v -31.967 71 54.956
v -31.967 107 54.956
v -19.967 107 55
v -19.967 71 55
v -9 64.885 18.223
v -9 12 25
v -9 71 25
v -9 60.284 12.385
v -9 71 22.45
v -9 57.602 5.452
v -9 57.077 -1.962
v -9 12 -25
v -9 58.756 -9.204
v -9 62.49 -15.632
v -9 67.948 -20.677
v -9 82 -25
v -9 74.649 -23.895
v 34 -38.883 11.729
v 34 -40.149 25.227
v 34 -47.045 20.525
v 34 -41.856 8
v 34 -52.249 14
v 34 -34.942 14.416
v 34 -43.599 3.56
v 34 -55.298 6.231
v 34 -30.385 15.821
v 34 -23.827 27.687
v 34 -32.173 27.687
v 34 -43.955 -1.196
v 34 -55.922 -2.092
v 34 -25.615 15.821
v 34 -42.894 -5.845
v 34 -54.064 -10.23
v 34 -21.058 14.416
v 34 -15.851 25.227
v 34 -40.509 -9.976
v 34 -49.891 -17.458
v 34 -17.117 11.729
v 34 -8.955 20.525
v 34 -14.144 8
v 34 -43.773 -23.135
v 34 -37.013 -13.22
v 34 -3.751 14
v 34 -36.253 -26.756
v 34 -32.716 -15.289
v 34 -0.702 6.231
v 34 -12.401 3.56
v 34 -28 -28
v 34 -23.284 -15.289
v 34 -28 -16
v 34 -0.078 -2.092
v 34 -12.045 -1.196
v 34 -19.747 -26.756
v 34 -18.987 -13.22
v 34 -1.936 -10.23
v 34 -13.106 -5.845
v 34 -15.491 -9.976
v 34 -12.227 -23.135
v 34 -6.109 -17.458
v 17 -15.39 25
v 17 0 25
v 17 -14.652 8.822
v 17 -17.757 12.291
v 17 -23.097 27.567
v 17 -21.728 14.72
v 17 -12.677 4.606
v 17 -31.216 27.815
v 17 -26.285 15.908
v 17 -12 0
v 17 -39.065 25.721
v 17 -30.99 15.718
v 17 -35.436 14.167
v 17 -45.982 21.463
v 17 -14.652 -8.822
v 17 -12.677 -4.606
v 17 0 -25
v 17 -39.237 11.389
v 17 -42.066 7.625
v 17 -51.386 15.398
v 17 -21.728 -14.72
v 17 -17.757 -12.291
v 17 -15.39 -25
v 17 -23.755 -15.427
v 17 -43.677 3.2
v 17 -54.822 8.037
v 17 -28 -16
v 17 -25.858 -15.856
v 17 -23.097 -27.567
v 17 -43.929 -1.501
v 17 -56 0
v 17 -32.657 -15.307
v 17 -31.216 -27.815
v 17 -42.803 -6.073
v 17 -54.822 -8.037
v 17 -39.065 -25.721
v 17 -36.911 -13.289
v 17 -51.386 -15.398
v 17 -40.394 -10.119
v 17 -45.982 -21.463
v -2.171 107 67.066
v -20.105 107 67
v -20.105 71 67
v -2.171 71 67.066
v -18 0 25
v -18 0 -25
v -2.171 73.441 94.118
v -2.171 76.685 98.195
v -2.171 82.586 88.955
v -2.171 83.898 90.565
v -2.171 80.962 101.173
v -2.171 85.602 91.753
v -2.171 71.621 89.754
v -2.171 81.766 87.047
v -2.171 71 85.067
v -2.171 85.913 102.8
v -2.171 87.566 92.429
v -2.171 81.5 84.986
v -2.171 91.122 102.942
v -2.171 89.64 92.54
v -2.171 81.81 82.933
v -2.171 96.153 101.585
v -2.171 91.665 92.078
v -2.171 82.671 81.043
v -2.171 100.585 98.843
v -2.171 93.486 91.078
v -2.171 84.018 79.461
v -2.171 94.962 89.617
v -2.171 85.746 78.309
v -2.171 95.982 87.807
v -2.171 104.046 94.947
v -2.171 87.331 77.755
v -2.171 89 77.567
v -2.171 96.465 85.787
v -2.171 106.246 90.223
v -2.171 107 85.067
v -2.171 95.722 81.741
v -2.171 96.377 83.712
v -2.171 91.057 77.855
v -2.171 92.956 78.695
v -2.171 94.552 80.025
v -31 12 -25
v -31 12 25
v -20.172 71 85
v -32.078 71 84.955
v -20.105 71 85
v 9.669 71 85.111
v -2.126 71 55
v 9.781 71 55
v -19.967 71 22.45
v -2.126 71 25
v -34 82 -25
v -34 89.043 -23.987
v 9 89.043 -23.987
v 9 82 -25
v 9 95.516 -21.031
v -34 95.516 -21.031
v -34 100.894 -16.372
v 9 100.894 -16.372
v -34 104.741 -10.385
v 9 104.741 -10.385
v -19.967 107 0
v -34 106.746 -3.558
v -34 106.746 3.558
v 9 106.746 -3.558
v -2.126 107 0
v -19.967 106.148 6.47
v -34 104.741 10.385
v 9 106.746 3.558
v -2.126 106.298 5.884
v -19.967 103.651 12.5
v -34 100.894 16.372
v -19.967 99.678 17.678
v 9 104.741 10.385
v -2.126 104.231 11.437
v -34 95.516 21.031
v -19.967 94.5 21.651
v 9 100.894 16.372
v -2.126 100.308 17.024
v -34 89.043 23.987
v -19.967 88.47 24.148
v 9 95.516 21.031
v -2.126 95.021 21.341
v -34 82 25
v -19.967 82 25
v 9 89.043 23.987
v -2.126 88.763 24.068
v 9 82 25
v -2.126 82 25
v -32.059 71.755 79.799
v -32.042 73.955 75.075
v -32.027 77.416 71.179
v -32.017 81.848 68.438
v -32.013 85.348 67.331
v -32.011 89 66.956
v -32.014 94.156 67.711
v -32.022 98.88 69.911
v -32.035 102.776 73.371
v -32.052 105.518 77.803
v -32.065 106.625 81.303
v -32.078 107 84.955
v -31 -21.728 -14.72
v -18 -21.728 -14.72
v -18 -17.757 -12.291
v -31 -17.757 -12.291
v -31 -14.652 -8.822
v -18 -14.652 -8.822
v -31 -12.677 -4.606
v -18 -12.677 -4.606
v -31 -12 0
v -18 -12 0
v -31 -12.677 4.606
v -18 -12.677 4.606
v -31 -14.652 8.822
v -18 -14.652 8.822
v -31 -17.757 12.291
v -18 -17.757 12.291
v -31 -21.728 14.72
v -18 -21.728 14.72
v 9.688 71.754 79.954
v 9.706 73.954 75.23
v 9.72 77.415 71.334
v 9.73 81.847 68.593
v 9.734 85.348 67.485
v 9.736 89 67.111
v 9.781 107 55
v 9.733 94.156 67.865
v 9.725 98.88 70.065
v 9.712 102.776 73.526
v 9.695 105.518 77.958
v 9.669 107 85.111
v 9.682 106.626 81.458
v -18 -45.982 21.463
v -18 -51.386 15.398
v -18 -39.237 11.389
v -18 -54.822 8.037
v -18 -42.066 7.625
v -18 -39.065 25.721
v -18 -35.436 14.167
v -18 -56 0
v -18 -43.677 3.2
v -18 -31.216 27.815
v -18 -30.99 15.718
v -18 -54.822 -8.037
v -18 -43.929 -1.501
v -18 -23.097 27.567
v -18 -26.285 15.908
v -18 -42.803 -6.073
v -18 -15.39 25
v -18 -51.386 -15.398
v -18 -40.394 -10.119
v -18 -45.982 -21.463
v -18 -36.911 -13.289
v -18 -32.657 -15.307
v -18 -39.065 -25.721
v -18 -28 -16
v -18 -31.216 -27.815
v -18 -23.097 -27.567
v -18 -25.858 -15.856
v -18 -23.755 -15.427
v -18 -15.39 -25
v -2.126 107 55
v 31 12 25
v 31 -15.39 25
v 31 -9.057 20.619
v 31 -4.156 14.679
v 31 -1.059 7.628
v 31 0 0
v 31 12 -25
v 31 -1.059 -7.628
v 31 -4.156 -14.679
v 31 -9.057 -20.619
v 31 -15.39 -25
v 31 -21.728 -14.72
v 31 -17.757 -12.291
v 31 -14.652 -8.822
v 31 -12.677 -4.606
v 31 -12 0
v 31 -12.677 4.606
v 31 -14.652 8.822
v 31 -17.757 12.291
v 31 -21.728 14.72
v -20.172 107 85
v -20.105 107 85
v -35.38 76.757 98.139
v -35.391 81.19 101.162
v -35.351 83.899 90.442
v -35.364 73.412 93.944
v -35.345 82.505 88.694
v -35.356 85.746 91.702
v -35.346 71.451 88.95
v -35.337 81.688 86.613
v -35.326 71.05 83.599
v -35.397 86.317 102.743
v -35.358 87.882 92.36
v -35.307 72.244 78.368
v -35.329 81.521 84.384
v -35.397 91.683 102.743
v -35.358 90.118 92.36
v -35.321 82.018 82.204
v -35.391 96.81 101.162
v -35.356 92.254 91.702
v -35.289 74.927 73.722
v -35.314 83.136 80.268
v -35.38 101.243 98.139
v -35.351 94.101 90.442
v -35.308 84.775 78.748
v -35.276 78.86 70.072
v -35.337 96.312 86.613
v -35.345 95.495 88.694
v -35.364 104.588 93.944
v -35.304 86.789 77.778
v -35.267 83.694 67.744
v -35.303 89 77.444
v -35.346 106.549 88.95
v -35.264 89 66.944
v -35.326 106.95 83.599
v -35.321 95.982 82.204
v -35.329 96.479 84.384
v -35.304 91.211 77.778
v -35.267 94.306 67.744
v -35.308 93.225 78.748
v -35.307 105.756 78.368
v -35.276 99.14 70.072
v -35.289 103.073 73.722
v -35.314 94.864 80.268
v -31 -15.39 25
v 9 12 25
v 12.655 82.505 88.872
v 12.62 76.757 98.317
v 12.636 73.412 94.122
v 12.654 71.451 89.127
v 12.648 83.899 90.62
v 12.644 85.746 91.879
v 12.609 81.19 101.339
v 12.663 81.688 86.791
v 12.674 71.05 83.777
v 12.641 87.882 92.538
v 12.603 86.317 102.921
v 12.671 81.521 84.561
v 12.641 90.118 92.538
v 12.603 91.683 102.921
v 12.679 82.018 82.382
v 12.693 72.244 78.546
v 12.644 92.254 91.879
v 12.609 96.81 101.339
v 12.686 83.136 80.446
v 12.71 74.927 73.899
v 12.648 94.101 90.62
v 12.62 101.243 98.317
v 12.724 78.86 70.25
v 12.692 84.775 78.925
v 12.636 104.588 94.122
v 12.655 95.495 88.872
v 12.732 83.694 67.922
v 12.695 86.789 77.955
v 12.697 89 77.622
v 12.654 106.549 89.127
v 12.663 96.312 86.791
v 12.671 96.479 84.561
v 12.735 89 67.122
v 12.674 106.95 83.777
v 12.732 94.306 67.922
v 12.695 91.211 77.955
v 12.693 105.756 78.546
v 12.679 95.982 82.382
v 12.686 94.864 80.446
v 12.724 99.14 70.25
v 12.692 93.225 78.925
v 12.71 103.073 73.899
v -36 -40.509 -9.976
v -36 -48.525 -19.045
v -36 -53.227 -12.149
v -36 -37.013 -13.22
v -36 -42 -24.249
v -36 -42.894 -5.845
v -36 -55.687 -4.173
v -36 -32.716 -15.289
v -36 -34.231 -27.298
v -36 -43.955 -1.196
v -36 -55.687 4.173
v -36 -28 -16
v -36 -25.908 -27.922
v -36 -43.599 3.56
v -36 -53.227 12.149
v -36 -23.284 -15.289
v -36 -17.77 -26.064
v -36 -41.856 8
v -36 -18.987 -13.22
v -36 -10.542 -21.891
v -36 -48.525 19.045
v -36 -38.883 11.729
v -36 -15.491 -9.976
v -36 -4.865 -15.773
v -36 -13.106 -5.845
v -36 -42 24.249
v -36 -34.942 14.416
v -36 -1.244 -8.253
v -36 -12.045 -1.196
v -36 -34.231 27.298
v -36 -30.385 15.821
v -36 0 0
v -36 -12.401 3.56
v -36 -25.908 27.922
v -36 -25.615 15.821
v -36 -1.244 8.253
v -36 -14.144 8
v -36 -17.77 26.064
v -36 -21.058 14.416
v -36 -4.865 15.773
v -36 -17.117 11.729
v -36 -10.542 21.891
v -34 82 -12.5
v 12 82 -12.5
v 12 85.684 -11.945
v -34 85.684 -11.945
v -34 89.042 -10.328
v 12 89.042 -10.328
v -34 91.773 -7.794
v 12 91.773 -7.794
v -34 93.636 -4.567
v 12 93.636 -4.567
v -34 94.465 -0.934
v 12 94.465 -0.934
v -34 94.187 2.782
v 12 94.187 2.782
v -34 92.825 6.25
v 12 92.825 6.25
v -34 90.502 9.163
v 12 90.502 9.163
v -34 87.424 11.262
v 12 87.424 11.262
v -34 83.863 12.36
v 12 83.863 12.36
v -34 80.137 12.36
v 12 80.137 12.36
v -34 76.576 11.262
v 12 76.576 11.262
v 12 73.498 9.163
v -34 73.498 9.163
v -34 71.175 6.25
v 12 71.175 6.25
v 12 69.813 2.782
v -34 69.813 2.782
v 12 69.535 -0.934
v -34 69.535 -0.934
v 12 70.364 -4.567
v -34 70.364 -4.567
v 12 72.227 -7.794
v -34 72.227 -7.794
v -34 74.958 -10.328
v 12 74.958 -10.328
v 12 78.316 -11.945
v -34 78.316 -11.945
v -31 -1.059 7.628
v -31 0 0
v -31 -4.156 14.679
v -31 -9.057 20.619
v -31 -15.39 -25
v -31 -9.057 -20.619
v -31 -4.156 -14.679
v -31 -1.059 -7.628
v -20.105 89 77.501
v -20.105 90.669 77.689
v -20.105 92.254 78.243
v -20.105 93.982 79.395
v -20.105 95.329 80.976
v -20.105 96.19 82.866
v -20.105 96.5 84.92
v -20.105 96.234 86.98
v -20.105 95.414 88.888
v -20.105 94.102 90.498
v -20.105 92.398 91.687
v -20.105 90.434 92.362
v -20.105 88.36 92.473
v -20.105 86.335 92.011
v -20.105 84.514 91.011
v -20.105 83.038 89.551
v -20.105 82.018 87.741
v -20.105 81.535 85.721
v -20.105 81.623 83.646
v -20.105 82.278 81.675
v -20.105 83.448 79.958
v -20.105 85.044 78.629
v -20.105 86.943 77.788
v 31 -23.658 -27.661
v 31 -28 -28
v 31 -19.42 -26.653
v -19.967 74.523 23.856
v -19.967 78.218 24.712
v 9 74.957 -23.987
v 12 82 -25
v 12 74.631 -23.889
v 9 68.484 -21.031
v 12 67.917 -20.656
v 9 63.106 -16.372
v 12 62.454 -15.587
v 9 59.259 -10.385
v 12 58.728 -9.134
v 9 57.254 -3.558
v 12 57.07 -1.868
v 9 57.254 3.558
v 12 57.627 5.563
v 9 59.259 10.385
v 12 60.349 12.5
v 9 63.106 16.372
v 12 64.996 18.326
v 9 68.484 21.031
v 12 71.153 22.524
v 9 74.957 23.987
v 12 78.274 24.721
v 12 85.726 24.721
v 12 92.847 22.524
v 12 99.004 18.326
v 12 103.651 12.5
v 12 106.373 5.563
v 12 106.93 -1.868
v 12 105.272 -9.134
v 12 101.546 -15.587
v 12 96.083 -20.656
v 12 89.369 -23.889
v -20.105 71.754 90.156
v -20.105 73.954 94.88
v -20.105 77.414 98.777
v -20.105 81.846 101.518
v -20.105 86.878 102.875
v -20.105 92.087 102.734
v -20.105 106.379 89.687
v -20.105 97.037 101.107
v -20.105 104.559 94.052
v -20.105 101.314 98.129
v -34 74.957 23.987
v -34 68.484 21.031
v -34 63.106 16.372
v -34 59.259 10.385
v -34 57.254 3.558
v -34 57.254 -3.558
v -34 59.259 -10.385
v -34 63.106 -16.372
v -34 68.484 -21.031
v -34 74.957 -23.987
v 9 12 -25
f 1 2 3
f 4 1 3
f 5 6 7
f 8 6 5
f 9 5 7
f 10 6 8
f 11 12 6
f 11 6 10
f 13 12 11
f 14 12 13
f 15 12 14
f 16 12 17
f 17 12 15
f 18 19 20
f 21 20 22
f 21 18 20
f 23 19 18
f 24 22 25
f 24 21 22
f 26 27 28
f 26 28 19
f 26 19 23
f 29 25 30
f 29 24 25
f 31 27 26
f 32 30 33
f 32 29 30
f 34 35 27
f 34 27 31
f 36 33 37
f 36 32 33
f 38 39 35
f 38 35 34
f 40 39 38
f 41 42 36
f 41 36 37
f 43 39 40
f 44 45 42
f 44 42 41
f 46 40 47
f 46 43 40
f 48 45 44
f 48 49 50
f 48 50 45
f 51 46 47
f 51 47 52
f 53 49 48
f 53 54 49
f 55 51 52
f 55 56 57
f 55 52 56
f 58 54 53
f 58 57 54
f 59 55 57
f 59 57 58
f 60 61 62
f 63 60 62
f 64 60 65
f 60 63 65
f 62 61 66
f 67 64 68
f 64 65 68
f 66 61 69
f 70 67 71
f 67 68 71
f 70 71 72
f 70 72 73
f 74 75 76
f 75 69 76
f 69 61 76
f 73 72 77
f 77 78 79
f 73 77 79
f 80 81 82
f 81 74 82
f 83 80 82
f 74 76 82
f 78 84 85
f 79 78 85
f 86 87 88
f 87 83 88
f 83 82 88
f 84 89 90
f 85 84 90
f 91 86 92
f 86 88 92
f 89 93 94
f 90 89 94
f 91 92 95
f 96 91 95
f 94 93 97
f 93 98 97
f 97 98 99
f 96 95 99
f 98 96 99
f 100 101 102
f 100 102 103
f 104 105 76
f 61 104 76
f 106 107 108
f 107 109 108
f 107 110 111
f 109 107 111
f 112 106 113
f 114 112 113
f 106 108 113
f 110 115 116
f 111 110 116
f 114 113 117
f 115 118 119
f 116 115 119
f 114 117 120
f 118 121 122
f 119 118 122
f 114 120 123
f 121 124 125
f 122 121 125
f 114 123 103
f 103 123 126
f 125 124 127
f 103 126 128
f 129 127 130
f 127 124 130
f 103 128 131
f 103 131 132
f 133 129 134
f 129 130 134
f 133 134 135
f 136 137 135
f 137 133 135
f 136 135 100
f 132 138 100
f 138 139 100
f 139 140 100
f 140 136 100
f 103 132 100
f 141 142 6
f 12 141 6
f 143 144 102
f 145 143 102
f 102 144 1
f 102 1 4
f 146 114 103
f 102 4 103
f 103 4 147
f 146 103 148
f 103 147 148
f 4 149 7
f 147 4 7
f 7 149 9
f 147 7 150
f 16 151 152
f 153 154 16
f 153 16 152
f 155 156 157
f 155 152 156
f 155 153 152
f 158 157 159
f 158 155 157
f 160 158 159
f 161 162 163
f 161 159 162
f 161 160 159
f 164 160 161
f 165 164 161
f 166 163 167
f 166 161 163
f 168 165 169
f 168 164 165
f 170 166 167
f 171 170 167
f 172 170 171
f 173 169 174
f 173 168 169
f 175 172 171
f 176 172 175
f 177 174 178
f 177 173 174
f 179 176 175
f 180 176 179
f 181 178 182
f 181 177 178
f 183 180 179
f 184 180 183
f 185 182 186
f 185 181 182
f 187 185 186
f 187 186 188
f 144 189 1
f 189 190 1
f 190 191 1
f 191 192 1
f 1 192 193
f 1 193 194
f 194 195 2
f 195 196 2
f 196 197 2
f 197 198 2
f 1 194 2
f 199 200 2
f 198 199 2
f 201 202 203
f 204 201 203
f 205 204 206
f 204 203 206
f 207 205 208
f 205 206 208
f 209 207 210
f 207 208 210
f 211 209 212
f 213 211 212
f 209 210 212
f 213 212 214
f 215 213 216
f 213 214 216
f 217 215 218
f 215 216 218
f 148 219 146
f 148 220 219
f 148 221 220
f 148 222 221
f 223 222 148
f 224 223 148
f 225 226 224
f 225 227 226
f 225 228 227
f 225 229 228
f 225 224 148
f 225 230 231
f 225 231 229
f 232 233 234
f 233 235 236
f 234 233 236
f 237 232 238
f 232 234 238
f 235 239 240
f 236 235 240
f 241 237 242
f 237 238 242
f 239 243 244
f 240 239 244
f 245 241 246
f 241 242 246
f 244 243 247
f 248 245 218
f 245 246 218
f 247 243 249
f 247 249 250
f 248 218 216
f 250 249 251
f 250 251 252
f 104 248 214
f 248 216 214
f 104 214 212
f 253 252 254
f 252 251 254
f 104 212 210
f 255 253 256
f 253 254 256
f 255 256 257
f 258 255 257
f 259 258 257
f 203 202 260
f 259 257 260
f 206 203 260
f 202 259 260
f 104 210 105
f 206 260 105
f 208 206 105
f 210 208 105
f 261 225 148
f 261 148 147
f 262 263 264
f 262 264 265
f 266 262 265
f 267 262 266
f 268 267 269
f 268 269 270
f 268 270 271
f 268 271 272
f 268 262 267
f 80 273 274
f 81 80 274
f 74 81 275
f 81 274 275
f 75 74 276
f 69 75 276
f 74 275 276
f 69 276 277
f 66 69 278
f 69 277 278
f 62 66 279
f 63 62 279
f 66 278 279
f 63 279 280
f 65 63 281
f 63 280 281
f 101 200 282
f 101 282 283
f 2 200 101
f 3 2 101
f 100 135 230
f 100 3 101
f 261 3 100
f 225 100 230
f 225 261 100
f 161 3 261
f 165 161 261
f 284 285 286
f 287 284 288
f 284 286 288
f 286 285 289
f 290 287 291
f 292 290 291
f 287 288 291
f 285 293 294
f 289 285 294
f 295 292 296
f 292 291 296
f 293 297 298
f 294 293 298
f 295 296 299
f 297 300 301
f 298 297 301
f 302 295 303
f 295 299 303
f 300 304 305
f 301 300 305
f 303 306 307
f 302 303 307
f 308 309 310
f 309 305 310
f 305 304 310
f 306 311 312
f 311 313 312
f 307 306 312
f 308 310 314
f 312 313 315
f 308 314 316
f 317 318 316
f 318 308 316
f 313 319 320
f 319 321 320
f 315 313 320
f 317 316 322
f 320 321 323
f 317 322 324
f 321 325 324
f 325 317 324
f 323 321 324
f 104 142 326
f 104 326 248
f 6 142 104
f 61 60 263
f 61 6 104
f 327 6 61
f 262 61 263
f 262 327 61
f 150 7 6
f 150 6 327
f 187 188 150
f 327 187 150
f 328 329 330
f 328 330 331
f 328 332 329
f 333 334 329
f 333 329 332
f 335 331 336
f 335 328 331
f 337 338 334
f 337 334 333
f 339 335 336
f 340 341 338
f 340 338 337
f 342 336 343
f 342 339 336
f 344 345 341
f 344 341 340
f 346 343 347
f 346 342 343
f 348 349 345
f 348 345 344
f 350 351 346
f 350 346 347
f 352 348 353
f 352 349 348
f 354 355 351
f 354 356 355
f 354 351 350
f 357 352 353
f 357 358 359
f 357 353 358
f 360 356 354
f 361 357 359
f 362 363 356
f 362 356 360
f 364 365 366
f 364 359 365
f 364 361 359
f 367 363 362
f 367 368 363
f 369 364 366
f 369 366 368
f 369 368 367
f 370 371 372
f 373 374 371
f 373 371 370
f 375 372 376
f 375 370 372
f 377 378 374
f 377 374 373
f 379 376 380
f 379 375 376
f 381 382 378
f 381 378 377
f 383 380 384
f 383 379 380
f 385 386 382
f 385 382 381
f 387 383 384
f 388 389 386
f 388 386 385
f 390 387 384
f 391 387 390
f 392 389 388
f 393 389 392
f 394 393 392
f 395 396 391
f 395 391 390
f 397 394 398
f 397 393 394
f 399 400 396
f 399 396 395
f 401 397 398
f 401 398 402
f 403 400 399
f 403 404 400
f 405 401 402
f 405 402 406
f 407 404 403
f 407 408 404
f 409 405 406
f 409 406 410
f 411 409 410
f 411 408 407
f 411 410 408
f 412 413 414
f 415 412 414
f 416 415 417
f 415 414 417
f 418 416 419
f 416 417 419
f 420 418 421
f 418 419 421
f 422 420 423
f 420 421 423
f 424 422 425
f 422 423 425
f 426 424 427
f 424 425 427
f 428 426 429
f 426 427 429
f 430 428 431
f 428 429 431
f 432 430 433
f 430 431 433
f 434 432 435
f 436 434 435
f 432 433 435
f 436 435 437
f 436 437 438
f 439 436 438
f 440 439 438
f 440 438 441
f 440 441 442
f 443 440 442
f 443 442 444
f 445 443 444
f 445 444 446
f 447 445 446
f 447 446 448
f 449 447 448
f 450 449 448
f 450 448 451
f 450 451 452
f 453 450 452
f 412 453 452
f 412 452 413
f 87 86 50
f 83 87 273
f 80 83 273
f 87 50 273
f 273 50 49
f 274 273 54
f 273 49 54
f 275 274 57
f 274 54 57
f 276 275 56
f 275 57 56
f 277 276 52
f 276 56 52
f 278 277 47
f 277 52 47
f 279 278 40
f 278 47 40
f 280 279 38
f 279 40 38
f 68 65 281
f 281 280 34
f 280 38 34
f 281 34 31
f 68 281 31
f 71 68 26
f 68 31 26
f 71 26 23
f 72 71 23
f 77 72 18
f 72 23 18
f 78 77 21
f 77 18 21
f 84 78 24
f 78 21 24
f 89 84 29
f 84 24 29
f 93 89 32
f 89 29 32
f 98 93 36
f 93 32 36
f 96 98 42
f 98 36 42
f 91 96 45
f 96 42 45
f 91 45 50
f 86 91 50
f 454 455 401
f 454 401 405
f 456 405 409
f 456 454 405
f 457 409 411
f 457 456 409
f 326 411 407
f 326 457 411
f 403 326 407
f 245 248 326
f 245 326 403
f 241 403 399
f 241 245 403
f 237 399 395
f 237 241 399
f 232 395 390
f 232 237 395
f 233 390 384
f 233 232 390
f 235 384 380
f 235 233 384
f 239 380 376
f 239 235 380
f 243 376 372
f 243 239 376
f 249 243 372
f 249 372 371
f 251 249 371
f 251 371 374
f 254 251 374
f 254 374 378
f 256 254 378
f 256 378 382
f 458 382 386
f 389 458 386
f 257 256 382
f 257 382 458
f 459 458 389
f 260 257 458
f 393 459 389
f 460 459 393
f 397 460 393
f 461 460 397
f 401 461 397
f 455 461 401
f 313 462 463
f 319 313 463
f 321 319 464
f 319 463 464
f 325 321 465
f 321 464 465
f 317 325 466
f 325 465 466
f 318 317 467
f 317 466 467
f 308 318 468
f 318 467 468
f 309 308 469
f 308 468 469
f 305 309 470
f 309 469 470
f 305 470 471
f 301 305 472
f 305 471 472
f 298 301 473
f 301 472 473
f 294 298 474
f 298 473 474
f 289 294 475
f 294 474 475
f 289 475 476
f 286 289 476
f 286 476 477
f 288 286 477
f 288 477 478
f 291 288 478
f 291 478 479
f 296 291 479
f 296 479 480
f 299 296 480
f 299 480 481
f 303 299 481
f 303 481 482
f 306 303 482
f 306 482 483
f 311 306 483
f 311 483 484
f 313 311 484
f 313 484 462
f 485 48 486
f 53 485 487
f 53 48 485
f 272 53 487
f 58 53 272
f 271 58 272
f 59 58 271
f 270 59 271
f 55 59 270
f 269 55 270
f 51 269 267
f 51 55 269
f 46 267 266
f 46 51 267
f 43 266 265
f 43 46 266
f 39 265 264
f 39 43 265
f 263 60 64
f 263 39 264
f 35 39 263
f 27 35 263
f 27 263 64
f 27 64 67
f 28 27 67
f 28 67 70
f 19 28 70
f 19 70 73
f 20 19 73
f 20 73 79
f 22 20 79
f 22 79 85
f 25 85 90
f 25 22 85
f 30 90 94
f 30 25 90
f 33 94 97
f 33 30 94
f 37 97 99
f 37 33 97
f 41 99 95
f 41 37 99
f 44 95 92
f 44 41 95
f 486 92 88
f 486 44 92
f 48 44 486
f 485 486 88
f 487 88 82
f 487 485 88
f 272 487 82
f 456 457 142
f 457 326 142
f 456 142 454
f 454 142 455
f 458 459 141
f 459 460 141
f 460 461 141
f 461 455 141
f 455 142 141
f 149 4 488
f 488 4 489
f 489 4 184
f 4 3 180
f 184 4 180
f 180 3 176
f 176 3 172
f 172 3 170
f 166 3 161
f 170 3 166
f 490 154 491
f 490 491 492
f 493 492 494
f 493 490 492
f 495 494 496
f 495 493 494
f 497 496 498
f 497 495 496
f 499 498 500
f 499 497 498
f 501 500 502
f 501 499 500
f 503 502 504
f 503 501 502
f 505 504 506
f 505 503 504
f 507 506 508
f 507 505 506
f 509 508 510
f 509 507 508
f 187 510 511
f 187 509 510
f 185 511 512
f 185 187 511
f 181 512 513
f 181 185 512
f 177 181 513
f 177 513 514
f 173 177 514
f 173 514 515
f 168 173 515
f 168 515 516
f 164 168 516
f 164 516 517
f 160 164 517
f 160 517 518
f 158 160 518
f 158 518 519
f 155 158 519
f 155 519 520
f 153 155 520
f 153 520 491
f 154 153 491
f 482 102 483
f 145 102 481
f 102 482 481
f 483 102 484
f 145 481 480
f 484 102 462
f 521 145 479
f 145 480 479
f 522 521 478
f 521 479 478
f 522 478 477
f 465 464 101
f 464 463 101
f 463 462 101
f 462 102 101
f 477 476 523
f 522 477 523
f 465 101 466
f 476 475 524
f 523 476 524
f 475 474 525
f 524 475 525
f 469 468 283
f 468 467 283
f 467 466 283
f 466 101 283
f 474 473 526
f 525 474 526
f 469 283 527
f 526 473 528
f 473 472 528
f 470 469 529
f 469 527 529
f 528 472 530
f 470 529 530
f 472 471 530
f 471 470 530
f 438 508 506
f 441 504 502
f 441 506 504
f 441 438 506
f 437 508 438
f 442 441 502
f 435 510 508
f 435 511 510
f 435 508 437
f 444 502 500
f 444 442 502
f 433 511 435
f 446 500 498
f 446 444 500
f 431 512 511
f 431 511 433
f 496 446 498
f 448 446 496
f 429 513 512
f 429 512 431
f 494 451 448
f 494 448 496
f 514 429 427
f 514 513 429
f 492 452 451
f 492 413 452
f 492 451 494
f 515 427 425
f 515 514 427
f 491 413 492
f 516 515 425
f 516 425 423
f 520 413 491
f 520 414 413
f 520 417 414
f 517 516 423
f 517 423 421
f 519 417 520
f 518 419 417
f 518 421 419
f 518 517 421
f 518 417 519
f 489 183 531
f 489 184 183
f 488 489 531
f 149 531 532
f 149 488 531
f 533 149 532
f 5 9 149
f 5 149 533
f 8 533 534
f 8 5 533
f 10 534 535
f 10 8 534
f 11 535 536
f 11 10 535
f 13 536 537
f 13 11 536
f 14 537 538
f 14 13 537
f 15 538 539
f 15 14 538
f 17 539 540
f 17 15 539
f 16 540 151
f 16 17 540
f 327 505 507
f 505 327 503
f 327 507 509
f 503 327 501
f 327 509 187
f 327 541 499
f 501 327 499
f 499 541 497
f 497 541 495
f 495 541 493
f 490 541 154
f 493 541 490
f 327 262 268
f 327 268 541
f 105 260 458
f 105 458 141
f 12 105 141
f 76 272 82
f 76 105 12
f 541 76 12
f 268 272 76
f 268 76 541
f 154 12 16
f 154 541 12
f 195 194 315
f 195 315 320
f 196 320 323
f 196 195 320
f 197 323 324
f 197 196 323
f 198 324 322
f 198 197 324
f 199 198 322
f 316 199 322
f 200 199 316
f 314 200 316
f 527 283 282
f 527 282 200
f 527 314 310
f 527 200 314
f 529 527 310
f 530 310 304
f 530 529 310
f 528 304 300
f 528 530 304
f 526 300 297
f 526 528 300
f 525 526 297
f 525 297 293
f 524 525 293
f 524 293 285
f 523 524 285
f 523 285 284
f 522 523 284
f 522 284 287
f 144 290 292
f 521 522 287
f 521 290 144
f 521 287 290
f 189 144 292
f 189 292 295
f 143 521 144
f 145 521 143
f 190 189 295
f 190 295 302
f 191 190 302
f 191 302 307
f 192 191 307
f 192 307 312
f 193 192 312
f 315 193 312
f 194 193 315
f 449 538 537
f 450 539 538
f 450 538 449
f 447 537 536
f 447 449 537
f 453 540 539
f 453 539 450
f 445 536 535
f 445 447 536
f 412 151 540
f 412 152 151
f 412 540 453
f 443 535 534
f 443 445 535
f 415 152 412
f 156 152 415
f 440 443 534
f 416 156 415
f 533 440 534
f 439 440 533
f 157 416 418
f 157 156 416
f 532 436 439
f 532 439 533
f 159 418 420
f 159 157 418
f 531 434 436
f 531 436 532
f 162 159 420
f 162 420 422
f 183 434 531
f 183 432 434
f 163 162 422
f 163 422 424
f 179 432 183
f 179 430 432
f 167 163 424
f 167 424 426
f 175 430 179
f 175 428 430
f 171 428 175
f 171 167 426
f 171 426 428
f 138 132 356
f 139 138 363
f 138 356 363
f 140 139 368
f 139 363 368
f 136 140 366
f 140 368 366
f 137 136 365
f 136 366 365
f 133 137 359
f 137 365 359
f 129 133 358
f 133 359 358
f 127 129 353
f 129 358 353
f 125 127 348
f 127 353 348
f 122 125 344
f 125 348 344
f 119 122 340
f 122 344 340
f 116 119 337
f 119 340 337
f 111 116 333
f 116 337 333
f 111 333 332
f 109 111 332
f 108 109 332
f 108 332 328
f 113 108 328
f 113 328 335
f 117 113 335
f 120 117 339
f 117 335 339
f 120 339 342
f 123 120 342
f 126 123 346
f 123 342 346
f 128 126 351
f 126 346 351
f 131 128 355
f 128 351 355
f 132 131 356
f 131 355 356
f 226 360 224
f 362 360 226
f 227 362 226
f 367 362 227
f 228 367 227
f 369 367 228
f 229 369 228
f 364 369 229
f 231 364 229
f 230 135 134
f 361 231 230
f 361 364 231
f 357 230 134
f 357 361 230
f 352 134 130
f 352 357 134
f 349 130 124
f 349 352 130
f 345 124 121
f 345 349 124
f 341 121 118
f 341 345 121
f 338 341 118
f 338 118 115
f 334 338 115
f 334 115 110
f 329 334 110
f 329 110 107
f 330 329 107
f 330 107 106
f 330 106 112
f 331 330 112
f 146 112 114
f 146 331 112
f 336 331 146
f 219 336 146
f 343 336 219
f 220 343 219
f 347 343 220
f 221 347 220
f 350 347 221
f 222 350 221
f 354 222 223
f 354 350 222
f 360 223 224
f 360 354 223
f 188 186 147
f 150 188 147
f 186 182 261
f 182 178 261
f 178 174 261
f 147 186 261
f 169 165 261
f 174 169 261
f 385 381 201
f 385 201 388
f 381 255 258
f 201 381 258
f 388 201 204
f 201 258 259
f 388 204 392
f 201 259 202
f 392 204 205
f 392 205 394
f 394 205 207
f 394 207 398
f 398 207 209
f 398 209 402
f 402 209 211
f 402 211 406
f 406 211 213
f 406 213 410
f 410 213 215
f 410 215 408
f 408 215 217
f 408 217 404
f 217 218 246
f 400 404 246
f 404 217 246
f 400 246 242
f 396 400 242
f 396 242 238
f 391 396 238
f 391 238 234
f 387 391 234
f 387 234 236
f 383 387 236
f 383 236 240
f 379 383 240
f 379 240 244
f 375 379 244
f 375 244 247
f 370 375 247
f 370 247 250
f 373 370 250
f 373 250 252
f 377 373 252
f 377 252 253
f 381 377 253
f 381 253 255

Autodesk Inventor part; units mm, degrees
ref_plane "YZ Plane" through (0, 0, 0) normal (1, 0, 0) x (0, 1, 0)
ref_plane "XZ Plane" through (0, 0, 0) normal (0, 1, 0) x (-1, 0, 0)
sketch "Sketch1" plane through (0, 0, 0) normal (0, 0, 1) x (1, 0, 0)
  line L0 (31, 0) -> (31, 12)
  line L1 (31, 12) -> (9, 12)
  line L2 (9, 12) -> (9, 82)
  line L3 (31, 0) -> (17, 0)
  line L4 (17, 0) -> (0, 0)
  line L5 (9, 82) -> (0, 82)
  line L6 (-31, 0) -> (-31, 12)
  line L7 (-31, 12) -> (-9, 12)
  line L8 (-9, 12) -> (-9, 82)
  line L9 (-31, 0) -> (-17, 0)
  line L10 (-17, 0) -> (0, 0)
  line L11 (-9, 82) -> (0, 82)
  point P0 (0, 0)
  dimension "d7" = 14
  dimension "d8" = 17
  dimension "d10" = 70
  dimension "d11" = 22
  dimension "d12" = 12
  dimension "d13" = 18
extrude "Extrusion1" add sketch "Sketch1" along normal mid plane 50
sketch "Sketch2" plane through (31, 0, 25) normal (1, 0, 0) x (0, 0, -1)
  line L0 (50, 82) -> (0, 82) projected
  circle A0 centre (25, -28) radius 28
  point P0 (25, 0)
  dimension "d17" = 56
extrude "Extrusion2" add sketch "Sketch2" along normal blind 3
sketch "Sketch3" plane through (31, 0, 25) normal (-1, 0, 0) x (0, 0, 1)
  arc A0 (-53, -28) -> (-25, 0) centre (-25, -28) ccw projected
  circle A1 centre (-25, -28) radius 28
  point P0 (-25, 0)
extrude "Extrusion3" add sketch "Sketch3" along normal blind 67
sketch "Sketch5" plane through (9, 12, 25) normal (1, 0, 0) x (0, 0, -1)
  line L0 (50, 70) -> (0, 70) projected
  circle A0 centre (25, 70) radius 25
  point P0 (25, -12)
  dimension "d24" = 50
extrude "Extrusion5" add sketch "Sketch5" along normal blind 3
sketch "Sketch6" plane through (9, 12, 25) normal (-1, 0, 0) x (0, 0, 1)
  arc A0 (0, 70) -> (-50, 70) centre (-25, 70) ccw projected
  circle A1 centre (-25, 70) radius 25
  point P0 (-25, -12)
  point P1 (0, 70)
extrude "Extrusion6" add sketch "Sketch6" along normal blind 43
sketch "Sketch7" plane through (-31, 12, 25) normal (0, 1, 0) x (1, 0, 0)
  point P0 (31, 25)
ref_plane "Work Plane1" through (12, 107, 55) normal (0, 1, 0) x (1, 0, 0)
sketch "Sketch10" plane through (12, 107, 55) normal (0, 1, 0) x (1, 0, 0)
  line L0 (-2.3312, -30.1107) -> (-2.219, -0.0002)
  line L1 (-2.219, -0.0002) -> (-14.1262, -0.0002)
  line L2 (-2.3312, -30.1107) -> (-14.238, -30.0664)
  line L3 (-44.0784, -29.9553) -> (-43.9668, 0.0445)
  line L4 (-43.9668, 0.0445) -> (-31.9669, -0.0002)
  line L5 (-44.0784, -29.9553) -> (-32.1716, -29.9996)
  line L6 (-14.1259, 55) -> (-31.9669, 55)
  line L7 (-2.219, 29.9997) -> (52.781, 29.9997) construction
  line L8 (-31.9669, -0.0002) -> (-31.9669, 55)
  line L9 (-14.1259, 55) -> (-14.1262, -0.0002)
  line L10 (-32.1716, -29.9996) -> (-14.238, -30.0664)
extrude "Extrusion8" add sketch "Sketch10" against normal blind 36
sketch "Sketch12" plane through (12, 82, 0) normal (1, 0, 0) x (0, 0, -1)
  circle A0 centre (0, 0) radius 12.5
  point P0 (0, -82)
  dimension "d48" = 25
sketch "Sketch13" plane through (34, -28, 0) normal (1, 0, 0) x (0, 0, -1)
  circle A0 centre (0, 0) radius 16
  point P0 (0, 28)
  dimension "d49" = 32
sketch "Sketch15" plane through (9.6688, 71, 85.1107) normal (1, 0, 0.0037) x (0.0037, 0, -1)
  line L0 (-0.0001, 36) -> (-0.0001, 0) projected
  circle A0 centre (-0.0001, 18) radius 18
  point P0 (85.0741, -71)
extrude "Extrusion9" add sketch "Sketch15" along normal blind 3
sketch "Sketch16" plane through (12.6688, 89, 85.1219) normal (1, 0, 0.0037) x (0.0037, 0, -1)
  circle A0 centre (0, 0) radius 18
  point P0 (85.0741, -89)
extrude "Extrusion10" add sketch "Sketch16" against normal blind 48
sketch "Sketch17" plane through (12, 107, 55) normal (0, 1, 0) x (1, 0, 0)
  line L0 (-32.1046, -11.9997) -> (-14.171, -12.0665) projected
  line L1 (-32.1046, -11.9997) -> (-32.1046, -64.3994)
  line L2 (-32.1046, -64.3994) -> (-14.171, -64.3994)
  line L3 (-14.171, -64.3994) -> (-14.171, -12.0665)
  line L4 (-14.171, -12.0665) -> (-32.1046, -11.9997)
  point P0 (-12, 55)
extrude "Extrusion11" cut sketch "Sketch17" against normal blind 48
sketch "Sketch18" plane through (12.6688, 89, 85.1219) normal (1, 0, 0.0037) x (0.0037, 0, -1)
  circle A0 centre (0, 0) radius 7.5
  point P0 (85.0741, -89)
  dimension "d56" = 15
extrude "Extrusion12" cut sketch "Sketch18" against normal blind 70
extrude "Extrusion13" cut sketch "Sketch12" against normal blind 70
extrude "Extrusion14" cut sketch "Sketch13" against normal blind 70
sketch "Sketch19" plane through (31, 0, 25) normal (1, 0, 0) x (0, 0, -1)
  line L0 (50, 12) -> (0, 12) projected
  line L1 (0, 12) -> (0, -21.7285)
  line L2 (0, -21.7285) -> (50, -21.7285)
  line L3 (50, -21.7285) -> (50, 12)
  line L4 (50, 12) -> (0, 12)
  point P0 (25, 0)
extrude "Extrusion15" add sketch "Sketch19" against normal blind 62
sketch "Sketch20" plane through (34, -28, 0) normal (1, 0, 0) x (0, 0, -1)
  circle A0 centre (0, 0) radius 16
  point P0 (0, 28)
extrude "Extrusion16" cut sketch "Sketch20" against normal blind 70
sketch "Sketch21" plane through (0, 0, 25) normal (0, 0, 1) x (1, 0, 0)
  line L0 (0, 0) -> (17, 0)
  line L1 (17, 0) -> (17, -69.3639)
  line L2 (17, -69.3639) -> (-1, -69.3639)
  line L3 (-1, -69.3639) -> (-18, -69.3639)
  line L4 (-18, -69.3639) -> (-18, 0)
  line L5 (-18, 0) -> (0, 0)
  dimension "d67" = 17
  dimension "d68" = 17
extrude "Extrusion17" cut sketch "Sketch21" along normal mid plane 150
properties part number "Sólido 2"
